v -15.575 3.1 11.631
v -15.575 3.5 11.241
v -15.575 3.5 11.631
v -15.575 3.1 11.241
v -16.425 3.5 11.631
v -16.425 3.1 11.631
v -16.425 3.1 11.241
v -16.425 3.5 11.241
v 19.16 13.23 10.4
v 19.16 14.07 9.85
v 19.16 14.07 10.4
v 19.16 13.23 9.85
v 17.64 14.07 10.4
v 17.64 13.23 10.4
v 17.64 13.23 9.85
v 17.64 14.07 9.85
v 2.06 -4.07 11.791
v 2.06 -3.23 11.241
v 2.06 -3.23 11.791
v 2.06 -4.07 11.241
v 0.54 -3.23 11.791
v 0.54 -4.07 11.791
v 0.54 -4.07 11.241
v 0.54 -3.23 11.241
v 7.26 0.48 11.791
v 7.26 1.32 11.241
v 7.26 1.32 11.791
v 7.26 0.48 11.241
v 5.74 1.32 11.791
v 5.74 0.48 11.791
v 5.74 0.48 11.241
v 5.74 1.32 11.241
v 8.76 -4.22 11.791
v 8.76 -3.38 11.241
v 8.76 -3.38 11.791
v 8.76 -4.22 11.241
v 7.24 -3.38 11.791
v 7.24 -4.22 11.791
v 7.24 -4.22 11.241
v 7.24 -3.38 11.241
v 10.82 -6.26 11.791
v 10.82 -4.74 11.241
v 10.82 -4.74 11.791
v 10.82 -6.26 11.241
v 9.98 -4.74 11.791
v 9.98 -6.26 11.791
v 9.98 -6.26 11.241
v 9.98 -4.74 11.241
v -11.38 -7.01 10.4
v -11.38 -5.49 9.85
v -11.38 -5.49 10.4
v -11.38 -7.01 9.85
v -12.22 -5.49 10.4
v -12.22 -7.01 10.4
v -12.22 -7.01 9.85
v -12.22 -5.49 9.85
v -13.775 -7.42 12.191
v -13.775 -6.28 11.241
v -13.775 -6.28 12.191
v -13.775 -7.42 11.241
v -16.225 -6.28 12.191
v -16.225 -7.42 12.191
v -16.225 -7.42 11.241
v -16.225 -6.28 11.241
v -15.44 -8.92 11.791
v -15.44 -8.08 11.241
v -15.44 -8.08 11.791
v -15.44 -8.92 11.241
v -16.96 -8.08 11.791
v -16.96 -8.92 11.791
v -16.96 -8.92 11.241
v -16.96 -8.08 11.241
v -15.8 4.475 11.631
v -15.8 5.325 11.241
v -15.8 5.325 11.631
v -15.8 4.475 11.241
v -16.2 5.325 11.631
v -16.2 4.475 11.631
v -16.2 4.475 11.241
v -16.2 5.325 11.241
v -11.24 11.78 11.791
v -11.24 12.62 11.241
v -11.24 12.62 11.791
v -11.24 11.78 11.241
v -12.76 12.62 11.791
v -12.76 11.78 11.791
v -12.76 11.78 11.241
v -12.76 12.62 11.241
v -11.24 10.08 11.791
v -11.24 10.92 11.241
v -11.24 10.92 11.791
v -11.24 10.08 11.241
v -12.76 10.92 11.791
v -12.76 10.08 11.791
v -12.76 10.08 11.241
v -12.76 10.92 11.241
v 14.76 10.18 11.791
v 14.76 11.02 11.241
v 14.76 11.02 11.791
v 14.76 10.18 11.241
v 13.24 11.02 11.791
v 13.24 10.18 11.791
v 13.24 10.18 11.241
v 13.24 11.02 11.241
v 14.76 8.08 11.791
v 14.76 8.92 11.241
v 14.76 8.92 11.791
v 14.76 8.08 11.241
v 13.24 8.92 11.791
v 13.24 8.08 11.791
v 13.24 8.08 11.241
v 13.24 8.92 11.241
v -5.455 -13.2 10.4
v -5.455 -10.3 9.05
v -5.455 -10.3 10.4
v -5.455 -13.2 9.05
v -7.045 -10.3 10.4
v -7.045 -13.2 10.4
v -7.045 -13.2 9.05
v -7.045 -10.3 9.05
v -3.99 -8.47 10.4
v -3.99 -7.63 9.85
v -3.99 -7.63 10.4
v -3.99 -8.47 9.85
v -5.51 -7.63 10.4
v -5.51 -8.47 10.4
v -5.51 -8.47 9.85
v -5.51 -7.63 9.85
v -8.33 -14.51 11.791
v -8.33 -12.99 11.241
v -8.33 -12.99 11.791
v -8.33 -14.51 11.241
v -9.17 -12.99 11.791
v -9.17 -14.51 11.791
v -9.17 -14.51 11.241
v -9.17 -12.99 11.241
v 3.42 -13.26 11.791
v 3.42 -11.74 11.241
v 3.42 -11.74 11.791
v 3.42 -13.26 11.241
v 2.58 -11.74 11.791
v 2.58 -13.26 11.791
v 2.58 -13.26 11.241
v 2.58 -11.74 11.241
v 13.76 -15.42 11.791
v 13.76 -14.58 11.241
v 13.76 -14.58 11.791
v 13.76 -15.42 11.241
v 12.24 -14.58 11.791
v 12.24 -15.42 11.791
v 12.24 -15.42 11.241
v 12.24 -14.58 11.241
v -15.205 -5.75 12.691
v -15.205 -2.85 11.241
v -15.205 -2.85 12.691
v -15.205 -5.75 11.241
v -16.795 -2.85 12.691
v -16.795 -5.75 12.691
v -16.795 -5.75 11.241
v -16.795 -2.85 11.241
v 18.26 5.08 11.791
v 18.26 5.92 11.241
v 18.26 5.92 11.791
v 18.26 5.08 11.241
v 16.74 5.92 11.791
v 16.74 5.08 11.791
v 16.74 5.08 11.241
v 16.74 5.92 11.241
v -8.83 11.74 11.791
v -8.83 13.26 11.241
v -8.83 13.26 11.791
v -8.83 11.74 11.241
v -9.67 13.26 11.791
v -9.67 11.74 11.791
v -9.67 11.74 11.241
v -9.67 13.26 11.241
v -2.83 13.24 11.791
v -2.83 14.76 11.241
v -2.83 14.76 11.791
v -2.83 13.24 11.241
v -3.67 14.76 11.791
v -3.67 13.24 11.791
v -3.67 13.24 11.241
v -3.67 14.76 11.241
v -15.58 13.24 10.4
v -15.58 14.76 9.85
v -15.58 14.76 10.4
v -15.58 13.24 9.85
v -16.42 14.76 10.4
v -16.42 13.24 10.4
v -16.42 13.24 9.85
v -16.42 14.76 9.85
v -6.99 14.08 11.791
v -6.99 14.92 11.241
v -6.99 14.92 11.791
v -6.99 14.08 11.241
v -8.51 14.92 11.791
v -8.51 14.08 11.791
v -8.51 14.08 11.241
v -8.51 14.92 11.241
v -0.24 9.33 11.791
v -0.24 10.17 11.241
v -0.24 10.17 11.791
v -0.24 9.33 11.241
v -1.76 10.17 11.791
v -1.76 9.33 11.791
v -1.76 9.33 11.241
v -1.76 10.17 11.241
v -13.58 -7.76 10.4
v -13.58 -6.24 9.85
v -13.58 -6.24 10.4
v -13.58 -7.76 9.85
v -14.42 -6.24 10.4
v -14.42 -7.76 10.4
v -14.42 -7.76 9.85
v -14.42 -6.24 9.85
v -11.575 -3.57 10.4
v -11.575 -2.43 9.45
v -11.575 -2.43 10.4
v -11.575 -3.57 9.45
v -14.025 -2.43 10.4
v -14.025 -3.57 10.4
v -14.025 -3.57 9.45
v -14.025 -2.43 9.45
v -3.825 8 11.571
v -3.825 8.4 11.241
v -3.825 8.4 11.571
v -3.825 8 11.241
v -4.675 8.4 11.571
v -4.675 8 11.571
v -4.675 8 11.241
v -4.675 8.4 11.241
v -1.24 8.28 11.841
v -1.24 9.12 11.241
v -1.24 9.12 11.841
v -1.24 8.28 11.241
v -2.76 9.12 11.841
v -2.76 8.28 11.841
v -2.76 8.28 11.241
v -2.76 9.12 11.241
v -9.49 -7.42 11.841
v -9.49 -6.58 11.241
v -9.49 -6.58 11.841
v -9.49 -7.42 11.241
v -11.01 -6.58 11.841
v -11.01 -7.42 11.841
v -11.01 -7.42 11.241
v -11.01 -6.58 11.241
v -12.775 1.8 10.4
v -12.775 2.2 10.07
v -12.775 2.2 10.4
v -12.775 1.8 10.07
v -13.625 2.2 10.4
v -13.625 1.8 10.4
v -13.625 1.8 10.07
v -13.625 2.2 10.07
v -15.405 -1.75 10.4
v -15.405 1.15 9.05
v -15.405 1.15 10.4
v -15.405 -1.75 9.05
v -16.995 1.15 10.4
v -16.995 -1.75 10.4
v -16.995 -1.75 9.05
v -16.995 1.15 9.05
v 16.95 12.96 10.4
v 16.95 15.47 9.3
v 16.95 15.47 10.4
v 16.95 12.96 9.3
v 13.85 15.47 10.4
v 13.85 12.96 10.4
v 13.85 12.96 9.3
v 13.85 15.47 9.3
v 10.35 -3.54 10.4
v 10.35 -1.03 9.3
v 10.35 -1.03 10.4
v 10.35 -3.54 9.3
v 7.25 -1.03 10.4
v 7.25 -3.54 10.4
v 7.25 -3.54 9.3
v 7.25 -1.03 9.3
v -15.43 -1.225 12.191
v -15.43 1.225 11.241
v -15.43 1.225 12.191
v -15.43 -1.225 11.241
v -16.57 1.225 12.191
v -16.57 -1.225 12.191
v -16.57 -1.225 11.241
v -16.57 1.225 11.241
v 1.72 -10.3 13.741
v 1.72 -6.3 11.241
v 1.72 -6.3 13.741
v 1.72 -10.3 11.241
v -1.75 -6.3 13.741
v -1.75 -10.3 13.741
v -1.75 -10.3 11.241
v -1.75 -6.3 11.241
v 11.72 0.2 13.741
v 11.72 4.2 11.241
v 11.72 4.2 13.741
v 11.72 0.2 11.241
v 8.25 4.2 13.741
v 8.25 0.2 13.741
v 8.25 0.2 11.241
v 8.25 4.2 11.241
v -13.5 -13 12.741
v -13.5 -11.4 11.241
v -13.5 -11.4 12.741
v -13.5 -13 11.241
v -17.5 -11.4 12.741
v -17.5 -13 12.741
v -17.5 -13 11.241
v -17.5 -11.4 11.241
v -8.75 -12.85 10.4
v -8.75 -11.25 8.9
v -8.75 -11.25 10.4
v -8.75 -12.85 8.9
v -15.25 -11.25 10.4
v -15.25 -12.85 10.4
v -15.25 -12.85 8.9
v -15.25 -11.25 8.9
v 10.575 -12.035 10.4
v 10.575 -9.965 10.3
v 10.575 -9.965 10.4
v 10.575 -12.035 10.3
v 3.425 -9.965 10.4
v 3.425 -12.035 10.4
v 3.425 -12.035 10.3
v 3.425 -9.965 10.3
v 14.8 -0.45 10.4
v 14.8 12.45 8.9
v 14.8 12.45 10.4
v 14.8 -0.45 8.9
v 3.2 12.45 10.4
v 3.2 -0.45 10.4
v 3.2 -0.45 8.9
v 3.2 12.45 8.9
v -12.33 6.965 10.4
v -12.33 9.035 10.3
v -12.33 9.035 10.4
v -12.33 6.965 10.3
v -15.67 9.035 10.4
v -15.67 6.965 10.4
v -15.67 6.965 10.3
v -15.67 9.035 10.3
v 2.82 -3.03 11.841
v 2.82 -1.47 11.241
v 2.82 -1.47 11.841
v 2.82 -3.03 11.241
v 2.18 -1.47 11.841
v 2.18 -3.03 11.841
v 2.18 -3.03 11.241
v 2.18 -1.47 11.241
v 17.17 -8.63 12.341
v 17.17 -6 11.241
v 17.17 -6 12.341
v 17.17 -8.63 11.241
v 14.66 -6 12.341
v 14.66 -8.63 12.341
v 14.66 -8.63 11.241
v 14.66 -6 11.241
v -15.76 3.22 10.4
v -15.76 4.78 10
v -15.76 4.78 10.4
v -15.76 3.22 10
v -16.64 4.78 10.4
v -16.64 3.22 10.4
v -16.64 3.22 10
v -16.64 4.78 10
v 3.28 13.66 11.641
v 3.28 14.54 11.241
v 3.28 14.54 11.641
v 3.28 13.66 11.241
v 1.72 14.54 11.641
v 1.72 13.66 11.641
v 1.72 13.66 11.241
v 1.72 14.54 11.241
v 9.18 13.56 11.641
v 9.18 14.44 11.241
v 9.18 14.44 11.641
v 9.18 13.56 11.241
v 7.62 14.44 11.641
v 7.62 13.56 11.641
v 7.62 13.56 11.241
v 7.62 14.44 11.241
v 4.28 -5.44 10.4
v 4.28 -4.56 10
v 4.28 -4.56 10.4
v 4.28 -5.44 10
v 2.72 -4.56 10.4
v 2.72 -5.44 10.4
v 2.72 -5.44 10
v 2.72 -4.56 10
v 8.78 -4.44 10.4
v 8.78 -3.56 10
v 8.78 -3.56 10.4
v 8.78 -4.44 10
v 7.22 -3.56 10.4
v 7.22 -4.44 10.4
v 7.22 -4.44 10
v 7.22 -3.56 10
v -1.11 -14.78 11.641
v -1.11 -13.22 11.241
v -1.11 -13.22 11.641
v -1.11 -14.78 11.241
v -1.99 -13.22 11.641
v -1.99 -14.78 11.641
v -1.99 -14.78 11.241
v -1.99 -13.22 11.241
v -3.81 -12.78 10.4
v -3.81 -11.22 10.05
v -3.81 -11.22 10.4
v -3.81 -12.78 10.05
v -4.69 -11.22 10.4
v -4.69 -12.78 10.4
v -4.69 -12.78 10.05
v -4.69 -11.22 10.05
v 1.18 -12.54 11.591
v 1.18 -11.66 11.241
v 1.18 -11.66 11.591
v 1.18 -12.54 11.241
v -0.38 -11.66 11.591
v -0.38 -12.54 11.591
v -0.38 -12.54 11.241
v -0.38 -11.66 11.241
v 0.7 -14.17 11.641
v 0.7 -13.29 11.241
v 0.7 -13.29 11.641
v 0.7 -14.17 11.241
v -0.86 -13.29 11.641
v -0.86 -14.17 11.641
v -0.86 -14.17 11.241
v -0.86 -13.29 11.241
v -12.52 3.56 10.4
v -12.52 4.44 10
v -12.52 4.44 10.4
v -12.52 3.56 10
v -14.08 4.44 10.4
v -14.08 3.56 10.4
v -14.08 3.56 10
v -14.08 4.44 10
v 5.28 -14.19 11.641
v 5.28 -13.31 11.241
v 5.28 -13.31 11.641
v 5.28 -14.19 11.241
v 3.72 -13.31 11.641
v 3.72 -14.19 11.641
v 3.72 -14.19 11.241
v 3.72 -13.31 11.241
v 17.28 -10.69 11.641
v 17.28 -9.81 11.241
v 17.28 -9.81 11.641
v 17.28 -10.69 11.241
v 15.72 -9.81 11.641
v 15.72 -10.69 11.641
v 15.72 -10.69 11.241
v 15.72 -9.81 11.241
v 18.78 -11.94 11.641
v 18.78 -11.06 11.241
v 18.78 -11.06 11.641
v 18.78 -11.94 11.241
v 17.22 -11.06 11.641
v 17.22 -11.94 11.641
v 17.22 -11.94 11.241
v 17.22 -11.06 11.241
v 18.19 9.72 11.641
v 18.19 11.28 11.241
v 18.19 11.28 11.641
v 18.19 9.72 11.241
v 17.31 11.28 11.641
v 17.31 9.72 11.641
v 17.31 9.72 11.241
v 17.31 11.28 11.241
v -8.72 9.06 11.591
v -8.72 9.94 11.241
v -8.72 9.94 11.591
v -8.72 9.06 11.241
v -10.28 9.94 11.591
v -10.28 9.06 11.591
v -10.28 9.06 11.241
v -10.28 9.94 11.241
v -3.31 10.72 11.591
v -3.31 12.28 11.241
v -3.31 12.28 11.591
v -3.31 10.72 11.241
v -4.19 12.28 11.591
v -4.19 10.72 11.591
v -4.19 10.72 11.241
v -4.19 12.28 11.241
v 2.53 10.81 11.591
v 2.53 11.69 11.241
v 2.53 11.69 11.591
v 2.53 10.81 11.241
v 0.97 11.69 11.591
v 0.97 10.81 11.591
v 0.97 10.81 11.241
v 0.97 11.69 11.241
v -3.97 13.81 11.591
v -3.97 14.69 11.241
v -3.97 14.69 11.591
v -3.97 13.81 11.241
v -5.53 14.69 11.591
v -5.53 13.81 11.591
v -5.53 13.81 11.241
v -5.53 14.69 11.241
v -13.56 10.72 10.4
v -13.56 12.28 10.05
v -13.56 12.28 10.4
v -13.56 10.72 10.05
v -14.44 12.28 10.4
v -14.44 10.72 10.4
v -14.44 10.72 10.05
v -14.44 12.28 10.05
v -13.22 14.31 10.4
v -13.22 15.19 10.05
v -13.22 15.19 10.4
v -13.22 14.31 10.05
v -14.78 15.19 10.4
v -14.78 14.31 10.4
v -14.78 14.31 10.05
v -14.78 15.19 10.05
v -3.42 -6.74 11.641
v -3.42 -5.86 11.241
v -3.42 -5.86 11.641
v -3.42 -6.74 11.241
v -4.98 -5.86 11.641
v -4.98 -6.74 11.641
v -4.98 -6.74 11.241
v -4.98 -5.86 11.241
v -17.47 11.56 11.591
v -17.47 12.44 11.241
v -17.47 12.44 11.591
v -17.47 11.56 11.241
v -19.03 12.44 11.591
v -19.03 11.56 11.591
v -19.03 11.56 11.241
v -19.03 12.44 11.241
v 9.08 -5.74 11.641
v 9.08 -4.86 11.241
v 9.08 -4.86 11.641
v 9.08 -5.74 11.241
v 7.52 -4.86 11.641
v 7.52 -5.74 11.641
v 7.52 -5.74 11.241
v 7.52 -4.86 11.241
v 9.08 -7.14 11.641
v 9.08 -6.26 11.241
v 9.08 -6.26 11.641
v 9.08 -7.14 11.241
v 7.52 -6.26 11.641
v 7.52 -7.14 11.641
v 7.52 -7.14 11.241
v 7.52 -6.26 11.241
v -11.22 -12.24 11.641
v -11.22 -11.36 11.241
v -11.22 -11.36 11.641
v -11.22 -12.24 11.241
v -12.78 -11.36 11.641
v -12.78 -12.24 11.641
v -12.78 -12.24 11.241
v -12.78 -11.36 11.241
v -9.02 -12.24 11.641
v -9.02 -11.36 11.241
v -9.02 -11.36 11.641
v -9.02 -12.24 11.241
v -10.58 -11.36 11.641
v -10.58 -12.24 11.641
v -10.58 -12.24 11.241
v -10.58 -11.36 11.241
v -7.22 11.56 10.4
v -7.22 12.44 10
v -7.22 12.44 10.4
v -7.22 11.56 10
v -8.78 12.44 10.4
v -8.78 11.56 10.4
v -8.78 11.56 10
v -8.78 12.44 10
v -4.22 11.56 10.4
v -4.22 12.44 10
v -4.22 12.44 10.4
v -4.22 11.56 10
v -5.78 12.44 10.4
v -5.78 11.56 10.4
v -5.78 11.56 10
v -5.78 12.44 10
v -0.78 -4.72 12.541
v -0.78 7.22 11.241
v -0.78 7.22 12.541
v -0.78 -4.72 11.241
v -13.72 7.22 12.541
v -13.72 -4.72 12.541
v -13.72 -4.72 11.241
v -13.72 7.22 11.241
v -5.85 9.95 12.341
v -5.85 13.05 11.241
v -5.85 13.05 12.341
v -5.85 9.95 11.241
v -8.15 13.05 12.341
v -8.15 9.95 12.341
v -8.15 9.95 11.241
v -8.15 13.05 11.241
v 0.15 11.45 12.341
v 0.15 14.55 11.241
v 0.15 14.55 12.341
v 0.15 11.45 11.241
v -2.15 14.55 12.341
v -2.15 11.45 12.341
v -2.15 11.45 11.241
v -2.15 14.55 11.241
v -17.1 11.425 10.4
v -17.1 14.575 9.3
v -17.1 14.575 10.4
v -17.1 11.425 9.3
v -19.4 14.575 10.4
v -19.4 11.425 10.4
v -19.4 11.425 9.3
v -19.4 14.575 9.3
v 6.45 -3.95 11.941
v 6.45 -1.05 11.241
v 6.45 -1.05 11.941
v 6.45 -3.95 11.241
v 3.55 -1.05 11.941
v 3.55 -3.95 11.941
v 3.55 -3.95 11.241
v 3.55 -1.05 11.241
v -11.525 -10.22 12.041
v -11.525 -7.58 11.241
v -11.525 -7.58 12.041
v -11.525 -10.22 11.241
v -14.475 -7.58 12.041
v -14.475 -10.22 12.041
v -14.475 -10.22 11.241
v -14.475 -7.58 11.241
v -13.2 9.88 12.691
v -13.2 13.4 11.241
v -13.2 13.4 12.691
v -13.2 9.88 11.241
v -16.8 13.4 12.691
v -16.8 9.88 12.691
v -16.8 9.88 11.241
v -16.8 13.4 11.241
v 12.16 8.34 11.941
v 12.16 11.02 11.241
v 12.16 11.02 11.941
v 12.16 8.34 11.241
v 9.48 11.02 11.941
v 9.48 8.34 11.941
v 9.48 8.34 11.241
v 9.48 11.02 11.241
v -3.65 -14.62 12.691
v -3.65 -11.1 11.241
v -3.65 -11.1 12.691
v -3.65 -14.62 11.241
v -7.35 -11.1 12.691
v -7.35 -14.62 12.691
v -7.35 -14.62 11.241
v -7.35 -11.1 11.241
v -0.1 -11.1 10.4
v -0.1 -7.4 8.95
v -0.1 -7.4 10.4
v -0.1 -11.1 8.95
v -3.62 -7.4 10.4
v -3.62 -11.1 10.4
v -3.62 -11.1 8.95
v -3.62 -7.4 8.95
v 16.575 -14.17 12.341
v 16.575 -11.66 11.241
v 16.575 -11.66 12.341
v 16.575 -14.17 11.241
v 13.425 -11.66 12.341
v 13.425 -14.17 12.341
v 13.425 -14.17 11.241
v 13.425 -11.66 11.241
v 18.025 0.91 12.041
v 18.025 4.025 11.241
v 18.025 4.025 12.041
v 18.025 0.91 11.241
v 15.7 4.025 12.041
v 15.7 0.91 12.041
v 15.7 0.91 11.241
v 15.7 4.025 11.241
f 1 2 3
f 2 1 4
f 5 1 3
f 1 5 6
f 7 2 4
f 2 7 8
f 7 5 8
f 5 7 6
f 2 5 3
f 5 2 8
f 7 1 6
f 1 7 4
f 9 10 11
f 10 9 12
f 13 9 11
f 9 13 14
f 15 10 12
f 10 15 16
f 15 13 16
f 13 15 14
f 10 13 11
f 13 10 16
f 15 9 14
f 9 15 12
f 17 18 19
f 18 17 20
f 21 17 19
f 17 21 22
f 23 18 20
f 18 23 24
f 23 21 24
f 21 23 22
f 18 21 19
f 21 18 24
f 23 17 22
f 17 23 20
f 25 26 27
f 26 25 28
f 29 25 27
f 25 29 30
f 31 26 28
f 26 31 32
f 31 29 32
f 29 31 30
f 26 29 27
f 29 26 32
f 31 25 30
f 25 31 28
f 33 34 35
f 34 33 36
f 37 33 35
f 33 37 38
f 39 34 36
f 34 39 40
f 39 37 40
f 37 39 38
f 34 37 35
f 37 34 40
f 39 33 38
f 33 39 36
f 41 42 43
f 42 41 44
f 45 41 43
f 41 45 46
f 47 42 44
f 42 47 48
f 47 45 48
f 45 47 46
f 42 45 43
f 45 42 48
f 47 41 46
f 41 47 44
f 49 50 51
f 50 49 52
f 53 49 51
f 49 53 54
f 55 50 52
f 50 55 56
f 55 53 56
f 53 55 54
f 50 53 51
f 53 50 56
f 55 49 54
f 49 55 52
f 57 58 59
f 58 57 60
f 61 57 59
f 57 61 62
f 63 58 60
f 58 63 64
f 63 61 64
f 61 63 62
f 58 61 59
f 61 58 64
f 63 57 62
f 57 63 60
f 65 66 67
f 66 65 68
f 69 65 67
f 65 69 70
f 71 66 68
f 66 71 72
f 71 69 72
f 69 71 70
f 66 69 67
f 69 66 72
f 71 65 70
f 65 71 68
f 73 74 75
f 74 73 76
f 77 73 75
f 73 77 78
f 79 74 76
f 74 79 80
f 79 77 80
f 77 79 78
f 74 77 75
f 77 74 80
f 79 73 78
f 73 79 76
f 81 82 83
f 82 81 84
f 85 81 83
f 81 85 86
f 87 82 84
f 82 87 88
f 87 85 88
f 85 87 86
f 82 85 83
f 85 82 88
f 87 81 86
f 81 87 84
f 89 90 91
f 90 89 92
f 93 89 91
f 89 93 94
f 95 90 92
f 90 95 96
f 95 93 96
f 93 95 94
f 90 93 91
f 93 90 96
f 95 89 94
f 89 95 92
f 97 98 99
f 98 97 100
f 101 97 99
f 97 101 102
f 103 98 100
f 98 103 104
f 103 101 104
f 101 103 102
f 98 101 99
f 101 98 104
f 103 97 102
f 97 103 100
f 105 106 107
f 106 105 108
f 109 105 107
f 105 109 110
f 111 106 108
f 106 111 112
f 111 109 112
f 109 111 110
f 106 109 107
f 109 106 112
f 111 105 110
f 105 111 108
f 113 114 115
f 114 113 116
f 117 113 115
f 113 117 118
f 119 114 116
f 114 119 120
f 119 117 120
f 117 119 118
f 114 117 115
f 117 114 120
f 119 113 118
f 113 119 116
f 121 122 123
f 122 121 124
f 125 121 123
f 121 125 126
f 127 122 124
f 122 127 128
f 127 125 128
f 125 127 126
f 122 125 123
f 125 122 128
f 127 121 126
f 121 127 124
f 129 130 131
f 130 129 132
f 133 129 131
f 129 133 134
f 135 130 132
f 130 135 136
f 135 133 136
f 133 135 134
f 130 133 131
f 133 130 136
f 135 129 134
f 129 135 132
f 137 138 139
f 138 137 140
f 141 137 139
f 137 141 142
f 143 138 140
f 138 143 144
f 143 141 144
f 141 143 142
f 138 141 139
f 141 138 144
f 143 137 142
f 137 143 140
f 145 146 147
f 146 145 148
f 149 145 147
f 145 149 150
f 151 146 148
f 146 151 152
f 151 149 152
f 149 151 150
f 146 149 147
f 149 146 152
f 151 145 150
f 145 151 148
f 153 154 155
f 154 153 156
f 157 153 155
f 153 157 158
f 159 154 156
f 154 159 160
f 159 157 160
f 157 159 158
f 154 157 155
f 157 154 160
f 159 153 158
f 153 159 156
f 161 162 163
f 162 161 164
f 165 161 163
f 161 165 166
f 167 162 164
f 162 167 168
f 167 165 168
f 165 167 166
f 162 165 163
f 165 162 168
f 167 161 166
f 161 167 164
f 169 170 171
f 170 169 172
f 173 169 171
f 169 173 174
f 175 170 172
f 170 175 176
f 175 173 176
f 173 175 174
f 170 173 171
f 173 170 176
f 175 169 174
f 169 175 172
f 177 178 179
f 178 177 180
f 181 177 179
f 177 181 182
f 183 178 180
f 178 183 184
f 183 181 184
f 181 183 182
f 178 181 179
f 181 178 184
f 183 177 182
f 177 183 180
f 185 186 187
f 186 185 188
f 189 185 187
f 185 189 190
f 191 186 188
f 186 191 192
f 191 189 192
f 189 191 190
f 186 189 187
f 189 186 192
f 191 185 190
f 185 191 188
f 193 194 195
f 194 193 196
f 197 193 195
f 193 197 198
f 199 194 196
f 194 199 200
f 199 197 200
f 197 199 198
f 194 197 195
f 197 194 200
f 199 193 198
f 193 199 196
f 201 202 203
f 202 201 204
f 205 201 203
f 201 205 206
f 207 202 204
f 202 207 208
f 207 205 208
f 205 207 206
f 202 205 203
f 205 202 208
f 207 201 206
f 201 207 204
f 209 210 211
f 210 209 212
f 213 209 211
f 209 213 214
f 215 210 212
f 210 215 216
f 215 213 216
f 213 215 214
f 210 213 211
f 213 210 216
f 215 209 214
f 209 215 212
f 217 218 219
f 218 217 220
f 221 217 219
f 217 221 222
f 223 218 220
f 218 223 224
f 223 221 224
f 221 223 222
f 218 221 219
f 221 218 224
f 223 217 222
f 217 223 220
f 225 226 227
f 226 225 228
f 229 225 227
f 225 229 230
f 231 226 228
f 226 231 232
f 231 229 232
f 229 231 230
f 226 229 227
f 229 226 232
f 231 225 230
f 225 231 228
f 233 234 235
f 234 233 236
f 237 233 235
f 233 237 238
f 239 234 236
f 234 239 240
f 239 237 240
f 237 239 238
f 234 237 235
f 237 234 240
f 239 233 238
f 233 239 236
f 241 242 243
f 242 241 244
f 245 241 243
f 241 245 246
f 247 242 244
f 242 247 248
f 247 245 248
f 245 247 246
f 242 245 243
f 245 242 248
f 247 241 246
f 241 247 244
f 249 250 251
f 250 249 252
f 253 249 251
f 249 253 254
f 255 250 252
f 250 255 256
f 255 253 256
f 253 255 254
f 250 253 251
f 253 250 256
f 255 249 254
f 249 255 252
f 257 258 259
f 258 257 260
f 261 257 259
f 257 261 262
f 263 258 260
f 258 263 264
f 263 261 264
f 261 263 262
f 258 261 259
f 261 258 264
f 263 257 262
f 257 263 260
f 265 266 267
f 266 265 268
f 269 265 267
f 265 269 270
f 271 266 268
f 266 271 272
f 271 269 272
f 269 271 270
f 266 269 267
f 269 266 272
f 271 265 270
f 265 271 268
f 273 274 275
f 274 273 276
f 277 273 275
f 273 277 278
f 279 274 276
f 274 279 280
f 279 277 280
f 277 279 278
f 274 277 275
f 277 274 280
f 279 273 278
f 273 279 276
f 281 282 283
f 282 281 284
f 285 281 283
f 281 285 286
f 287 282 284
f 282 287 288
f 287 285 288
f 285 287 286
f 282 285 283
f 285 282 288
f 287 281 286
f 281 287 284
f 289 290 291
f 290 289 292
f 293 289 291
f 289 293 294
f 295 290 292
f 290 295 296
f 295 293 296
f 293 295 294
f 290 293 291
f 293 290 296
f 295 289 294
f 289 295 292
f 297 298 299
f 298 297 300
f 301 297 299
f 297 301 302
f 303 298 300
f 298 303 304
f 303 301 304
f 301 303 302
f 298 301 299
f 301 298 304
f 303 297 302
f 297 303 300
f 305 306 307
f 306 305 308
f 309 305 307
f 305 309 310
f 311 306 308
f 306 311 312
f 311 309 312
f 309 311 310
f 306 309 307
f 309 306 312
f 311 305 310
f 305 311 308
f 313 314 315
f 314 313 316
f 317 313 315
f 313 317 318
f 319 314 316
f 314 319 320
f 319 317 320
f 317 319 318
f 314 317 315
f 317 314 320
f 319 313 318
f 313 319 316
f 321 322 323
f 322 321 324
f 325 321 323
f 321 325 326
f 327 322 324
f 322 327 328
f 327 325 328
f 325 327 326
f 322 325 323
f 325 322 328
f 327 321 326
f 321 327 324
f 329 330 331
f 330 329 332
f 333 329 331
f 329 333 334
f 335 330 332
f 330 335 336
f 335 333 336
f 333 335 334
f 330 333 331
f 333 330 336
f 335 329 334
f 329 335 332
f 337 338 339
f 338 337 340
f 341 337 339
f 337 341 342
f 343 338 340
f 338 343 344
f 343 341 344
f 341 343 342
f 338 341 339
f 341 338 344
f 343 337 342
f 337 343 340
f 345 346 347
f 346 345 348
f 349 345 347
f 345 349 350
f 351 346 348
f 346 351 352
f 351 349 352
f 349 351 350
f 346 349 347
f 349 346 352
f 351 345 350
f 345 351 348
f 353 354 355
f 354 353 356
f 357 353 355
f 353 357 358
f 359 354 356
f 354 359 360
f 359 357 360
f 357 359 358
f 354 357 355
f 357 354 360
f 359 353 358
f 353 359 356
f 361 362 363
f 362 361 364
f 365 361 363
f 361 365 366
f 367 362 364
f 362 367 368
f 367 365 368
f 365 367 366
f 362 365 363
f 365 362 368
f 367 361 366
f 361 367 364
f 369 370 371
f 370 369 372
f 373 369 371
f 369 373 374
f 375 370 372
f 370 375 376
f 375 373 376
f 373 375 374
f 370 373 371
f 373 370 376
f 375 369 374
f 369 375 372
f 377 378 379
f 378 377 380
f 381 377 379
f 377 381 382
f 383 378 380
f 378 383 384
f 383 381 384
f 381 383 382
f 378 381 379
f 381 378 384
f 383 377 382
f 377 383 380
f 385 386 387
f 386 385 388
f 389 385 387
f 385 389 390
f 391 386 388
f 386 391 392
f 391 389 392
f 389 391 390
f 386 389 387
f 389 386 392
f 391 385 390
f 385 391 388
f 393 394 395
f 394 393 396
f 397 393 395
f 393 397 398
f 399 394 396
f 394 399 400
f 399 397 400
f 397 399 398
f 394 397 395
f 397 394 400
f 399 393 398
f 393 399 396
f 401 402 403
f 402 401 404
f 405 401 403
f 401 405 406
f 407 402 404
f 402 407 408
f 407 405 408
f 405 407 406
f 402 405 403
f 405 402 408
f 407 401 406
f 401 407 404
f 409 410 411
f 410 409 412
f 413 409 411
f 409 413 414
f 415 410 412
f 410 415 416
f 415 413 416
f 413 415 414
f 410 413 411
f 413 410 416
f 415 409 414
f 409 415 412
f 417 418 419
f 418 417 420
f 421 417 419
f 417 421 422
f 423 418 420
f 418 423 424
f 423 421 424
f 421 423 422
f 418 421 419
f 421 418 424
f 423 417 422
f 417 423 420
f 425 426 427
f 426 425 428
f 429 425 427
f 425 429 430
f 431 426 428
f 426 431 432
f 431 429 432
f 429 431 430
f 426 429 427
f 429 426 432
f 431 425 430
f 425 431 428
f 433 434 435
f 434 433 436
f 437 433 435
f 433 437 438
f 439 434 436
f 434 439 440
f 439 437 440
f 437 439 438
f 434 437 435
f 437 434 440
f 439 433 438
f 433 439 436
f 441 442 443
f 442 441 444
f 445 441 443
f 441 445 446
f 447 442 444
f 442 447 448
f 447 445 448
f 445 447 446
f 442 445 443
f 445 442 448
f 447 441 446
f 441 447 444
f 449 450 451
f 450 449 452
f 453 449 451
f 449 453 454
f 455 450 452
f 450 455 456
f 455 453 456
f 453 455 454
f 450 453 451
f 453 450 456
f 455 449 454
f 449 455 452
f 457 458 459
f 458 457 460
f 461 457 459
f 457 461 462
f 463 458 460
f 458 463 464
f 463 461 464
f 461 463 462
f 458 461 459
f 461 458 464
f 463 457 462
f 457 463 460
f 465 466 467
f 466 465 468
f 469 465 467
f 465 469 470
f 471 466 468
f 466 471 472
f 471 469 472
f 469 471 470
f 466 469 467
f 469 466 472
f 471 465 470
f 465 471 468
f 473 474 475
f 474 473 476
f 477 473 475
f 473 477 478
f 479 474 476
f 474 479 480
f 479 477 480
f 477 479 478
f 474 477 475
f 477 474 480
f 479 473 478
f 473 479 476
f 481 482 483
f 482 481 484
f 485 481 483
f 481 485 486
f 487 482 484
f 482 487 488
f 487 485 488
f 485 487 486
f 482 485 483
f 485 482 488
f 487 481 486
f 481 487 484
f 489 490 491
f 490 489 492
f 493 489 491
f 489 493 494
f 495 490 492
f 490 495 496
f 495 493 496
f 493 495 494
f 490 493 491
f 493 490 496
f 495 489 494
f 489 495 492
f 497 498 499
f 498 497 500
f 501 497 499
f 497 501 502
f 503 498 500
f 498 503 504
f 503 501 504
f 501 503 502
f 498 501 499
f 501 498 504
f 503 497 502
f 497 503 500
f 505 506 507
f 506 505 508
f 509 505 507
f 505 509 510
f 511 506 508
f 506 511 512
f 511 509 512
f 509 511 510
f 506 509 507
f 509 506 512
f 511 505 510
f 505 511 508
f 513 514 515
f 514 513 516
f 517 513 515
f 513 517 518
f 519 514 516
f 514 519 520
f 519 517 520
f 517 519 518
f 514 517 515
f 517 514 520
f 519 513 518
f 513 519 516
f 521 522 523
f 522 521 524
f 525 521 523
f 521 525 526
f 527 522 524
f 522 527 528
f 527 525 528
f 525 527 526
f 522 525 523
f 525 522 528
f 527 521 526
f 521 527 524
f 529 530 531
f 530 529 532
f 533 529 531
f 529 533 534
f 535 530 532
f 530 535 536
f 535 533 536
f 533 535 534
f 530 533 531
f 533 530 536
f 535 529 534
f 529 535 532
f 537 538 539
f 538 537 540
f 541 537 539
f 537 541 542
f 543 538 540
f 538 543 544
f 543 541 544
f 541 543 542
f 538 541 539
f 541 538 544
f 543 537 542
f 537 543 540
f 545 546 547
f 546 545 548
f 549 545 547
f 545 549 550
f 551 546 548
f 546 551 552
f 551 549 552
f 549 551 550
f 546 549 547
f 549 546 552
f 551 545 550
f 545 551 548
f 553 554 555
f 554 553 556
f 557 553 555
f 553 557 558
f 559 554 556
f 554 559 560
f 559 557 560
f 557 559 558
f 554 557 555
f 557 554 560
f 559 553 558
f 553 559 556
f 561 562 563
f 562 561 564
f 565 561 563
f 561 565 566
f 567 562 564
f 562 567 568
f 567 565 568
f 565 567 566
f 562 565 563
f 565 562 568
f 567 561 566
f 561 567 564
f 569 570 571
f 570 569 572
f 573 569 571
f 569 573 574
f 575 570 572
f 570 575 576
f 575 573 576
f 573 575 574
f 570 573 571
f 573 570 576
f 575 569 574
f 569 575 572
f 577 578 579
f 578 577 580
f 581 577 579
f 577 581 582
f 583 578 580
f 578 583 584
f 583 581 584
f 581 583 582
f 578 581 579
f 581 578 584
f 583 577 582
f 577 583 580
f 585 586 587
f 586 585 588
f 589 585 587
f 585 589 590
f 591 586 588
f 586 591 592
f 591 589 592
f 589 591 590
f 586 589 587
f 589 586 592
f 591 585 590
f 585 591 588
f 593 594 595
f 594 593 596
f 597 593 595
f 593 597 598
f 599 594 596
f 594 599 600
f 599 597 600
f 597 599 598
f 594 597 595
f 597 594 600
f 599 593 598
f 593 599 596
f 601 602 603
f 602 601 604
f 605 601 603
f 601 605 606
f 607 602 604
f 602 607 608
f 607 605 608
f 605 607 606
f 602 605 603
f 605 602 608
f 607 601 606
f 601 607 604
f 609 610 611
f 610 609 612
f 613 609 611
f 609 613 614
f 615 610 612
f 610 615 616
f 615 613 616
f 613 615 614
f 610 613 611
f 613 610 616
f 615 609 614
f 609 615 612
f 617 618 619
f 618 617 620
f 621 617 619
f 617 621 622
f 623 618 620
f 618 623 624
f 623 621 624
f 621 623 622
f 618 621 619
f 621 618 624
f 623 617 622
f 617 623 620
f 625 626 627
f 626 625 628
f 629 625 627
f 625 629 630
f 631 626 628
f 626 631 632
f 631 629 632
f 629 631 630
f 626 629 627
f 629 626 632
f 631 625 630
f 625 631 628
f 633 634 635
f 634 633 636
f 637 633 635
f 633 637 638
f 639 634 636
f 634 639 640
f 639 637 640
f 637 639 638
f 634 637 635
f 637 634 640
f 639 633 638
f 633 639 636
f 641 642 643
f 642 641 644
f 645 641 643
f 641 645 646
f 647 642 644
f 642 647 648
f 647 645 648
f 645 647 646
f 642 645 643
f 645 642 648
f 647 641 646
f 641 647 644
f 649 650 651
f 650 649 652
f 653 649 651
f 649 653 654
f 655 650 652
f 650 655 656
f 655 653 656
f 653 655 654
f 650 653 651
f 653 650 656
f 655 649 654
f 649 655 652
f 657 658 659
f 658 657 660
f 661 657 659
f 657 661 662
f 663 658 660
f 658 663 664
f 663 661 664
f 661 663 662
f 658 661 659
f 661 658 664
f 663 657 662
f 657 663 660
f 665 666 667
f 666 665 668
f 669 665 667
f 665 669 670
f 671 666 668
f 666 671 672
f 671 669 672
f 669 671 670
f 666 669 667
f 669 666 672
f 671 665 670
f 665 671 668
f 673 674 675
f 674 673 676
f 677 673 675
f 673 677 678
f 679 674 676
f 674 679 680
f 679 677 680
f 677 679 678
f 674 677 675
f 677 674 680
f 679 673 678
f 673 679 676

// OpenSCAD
// Simplified component envelopes at native positions; not supplier 3D models.
color([0.12, 0.13, 0.16])translate([-16.425,3.1,11.24088])cube([0.8500000000000014,0.3999999999999999,0.39]); // C1
color([0.12, 0.13, 0.16])translate([17.64,13.23,9.85])cube([1.5199999999999996,0.8399999999999999,0.55]); // C10
color([0.12, 0.13, 0.16])translate([0.54,-4.07,11.24088])cube([1.52,0.8400000000000003,0.55]); // C13
color([0.12, 0.13, 0.16])translate([5.74,0.48,11.24088])cube([1.5199999999999996,0.8400000000000001,0.55]); // C14
color([0.12, 0.13, 0.16])translate([7.24,-4.22,11.24088])cube([1.5199999999999996,0.8399999999999999,0.55]); // C15
color([0.12, 0.13, 0.16])translate([9.98,-6.26,11.24088])cube([0.8399999999999999,1.5199999999999996,0.55]); // C16
color([0.12, 0.13, 0.16])translate([-12.22,-7.01,9.85])cube([0.8399999999999999,1.5199999999999996,0.55]); // C17
color([0.12, 0.13, 0.16])translate([-16.225,-7.42,11.24088])cube([2.450000000000001,1.1399999999999997,0.95]); // C18
color([0.12, 0.13, 0.16])translate([-16.96,-8.92,11.24088])cube([1.5200000000000014,0.8399999999999999,0.55]); // C19
color([0.12, 0.13, 0.16])translate([-16.2,4.475,11.24088])cube([0.3999999999999986,0.8500000000000005,0.39]); // C2
color([0.12, 0.13, 0.16])translate([-12.76,11.78,11.24088])cube([1.5199999999999996,0.8399999999999999,0.55]); // C20
color([0.12, 0.13, 0.16])translate([-12.76,10.08,11.24088])cube([1.5199999999999996,0.8399999999999999,0.55]); // C21
color([0.12, 0.13, 0.16])translate([13.24,10.18,11.24088])cube([1.5199999999999996,0.8399999999999999,0.55]); // C23
color([0.12, 0.13, 0.16])translate([13.24,8.08,11.24088])cube([1.5199999999999996,0.8399999999999999,0.55]); // C24
color([0.12, 0.13, 0.16])translate([-7.045,-13.2,9.05])cube([1.5899999999999999,2.8999999999999986,1.35]); // C25
color([0.12, 0.13, 0.16])translate([-5.51,-8.47,9.85])cube([1.5199999999999996,0.8400000000000007,0.55]); // C26
color([0.12, 0.13, 0.16])translate([-9.17,-14.51,11.24088])cube([0.8399999999999999,1.5199999999999996,0.55]); // C27
color([0.12, 0.13, 0.16])translate([2.58,-13.26,11.24088])cube([0.8399999999999999,1.5199999999999996,0.55]); // C28
color([0.12, 0.13, 0.16])translate([12.24,-15.42,11.24088])cube([1.5199999999999996,0.8399999999999999,0.55]); // C29
color([0.12, 0.13, 0.16])translate([-16.795,-5.75,11.24088])cube([1.5900000000000016,2.9,1.45]); // C3
color([0.12, 0.13, 0.16])translate([16.74,5.08,11.24088])cube([1.5200000000000031,0.8399999999999999,0.55]); // C30
color([0.12, 0.13, 0.16])translate([-9.67,11.74,11.24088])cube([0.8399999999999999,1.5199999999999996,0.55]); // C31
color([0.12, 0.13, 0.16])translate([-3.67,13.24,11.24088])cube([0.8399999999999999,1.5199999999999996,0.55]); // C32
color([0.12, 0.13, 0.16])translate([-16.42,13.24,9.85])cube([0.8400000000000016,1.5199999999999996,0.55]); // C33
color([0.12, 0.13, 0.16])translate([-8.51,14.08,11.24088])cube([1.5199999999999996,0.8399999999999999,0.55]); // C34
color([0.12, 0.13, 0.16])translate([-1.76,9.33,11.24088])cube([1.52,0.8399999999999999,0.55]); // C35
color([0.12, 0.13, 0.16])translate([-14.42,-7.76,9.85])cube([0.8399999999999999,1.5199999999999996,0.55]); // C36
color([0.12, 0.13, 0.16])translate([-14.025,-3.57,9.450000000000001])cube([2.450000000000001,1.1399999999999997,0.95]); // C4
color([0.12, 0.13, 0.16])translate([-4.675,8.0,11.24088])cube([0.8499999999999996,0.40000000000000036,0.33]); // C5
color([0.12, 0.13, 0.16])translate([-2.76,8.28,11.24088])cube([1.5199999999999998,0.8399999999999999,0.6]); // C6
color([0.12, 0.13, 0.16])translate([-11.01,-7.42,11.24088])cube([1.5199999999999996,0.8399999999999999,0.6]); // C7
color([0.12, 0.13, 0.16])translate([-13.625,1.8,10.07])cube([0.8499999999999996,0.40000000000000013,0.33]); // C8
color([0.12, 0.13, 0.16])translate([-16.995,-1.75,9.05])cube([1.5900000000000016,2.9,1.35]); // C9
color([0.12, 0.13, 0.16])translate([13.85,12.96,9.3])cube([3.0999999999999996,2.51,1.1]); // D1
color([0.12, 0.13, 0.16])translate([7.25,-3.54,9.3])cube([3.0999999999999996,2.51,1.1]); // D2
color([0.12, 0.13, 0.16])translate([-16.57,-1.225,11.24088])cube([1.1400000000000006,2.45,0.95]); // FB1
color([0.12, 0.13, 0.16])translate([-1.75,-10.3,11.24088])cube([3.4699999999999998,4.000000000000001,2.5]); // J1
color([0.12, 0.13, 0.16])translate([8.25,0.2,11.24088])cube([3.4700000000000006,4.0,2.5]); // J2
color([0.12, 0.13, 0.16])translate([-17.5,-13.0,11.24088])cube([4.0,1.5999999999999996,1.5]); // J3
color([0.12, 0.13, 0.16])translate([-15.25,-12.85,8.9])cube([6.5,1.5999999999999996,1.5]); // J4
color([0.12, 0.13, 0.16])translate([3.425,-12.035,10.3])cube([7.1499999999999995,2.0700000000000003,0.1]); // J5
color([0.57, 0.6, 0.64])translate([3.2,-0.45,8.9])cube([11.600000000000001,12.899999999999999,1.5]); // J6
color([0.12, 0.13, 0.16])translate([-15.67,6.965,10.3])cube([3.34,2.0700000000000003,0.1]); // J7
color([0.12, 0.13, 0.16])translate([2.18,-3.03,11.24088])cube([0.6399999999999997,1.5599999999999998,0.6]); // L1
color([0.12, 0.13, 0.16])translate([14.66,-8.63,11.24088])cube([2.5100000000000016,2.630000000000001,1.1]); // Q1
color([0.12, 0.13, 0.16])translate([-16.64,3.22,10.0])cube([0.8800000000000008,1.56,0.4]); // R1
color([0.12, 0.13, 0.16])translate([1.72,13.66,11.24088])cube([1.5599999999999998,0.879999999999999,0.4]); // R12
color([0.12, 0.13, 0.16])translate([7.62,13.56,11.24088])cube([1.5599999999999996,0.879999999999999,0.4]); // R13
color([0.12, 0.13, 0.16])translate([2.72,-5.44,10.0])cube([1.56,0.8800000000000008,0.4]); // R14
color([0.12, 0.13, 0.16])translate([7.22,-4.44,10.0])cube([1.5599999999999996,0.8800000000000003,0.4]); // R15
color([0.12, 0.13, 0.16])translate([-1.99,-14.78,11.24088])cube([0.8799999999999999,1.5599999999999987,0.4]); // R16
color([0.12, 0.13, 0.16])translate([-4.69,-12.78,10.05])cube([0.8800000000000003,1.5599999999999987,0.35]); // R17
color([0.12, 0.13, 0.16])translate([-0.38,-12.54,11.24088])cube([1.56,0.879999999999999,0.35]); // R18
color([0.12, 0.13, 0.16])translate([-0.86,-14.17,11.24088])cube([1.56,0.8800000000000008,0.4]); // R19
color([0.12, 0.13, 0.16])translate([-14.08,3.56,10.0])cube([1.5600000000000005,0.8800000000000003,0.4]); // R2
color([0.12, 0.13, 0.16])translate([3.72,-14.19,11.24088])cube([1.56,0.879999999999999,0.4]); // R20
color([0.12, 0.13, 0.16])translate([15.72,-10.69,11.24088])cube([1.5600000000000005,0.879999999999999,0.4]); // R21
color([0.12, 0.13, 0.16])translate([17.22,-11.94,11.24088])cube([1.5600000000000023,0.879999999999999,0.4]); // R22
color([0.12, 0.13, 0.16])translate([17.31,9.72,11.24088])cube([0.8800000000000026,1.5599999999999987,0.4]); // R23
color([0.12, 0.13, 0.16])translate([-10.28,9.06,11.24088])cube([1.5599999999999987,0.879999999999999,0.35]); // R24
color([0.12, 0.13, 0.16])translate([-4.19,10.72,11.24088])cube([0.8800000000000003,1.5599999999999987,0.35]); // R25
color([0.12, 0.13, 0.16])translate([0.97,10.81,11.24088])cube([1.5599999999999998,0.879999999999999,0.35]); // R26
color([0.12, 0.13, 0.16])translate([-5.53,13.81,11.24088])cube([1.56,0.879999999999999,0.35]); // R27
color([0.12, 0.13, 0.16])translate([-14.44,10.72,10.05])cube([0.879999999999999,1.5599999999999987,0.35]); // R28
color([0.12, 0.13, 0.16])translate([-14.78,14.31,10.05])cube([1.5599999999999987,0.879999999999999,0.35]); // R29
color([0.12, 0.13, 0.16])translate([-4.98,-6.74,11.24088])cube([1.5600000000000005,0.8799999999999999,0.4]); // R3
color([0.12, 0.13, 0.16])translate([-19.03,11.56,11.24088])cube([1.5600000000000023,0.879999999999999,0.35]); // R30
color([0.12, 0.13, 0.16])translate([7.52,-5.74,11.24088])cube([1.5600000000000005,0.8799999999999999,0.4]); // R4
color([0.12, 0.13, 0.16])translate([7.52,-7.14,11.24088])cube([1.5600000000000005,0.8799999999999999,0.4]); // R5
color([0.12, 0.13, 0.16])translate([-12.78,-12.24,11.24088])cube([1.5599999999999987,0.8800000000000008,0.4]); // R6
color([0.12, 0.13, 0.16])translate([-10.58,-12.24,11.24088])cube([1.5600000000000005,0.8800000000000008,0.4]); // R7
color([0.12, 0.13, 0.16])translate([-8.78,11.56,10.0])cube([1.5599999999999996,0.879999999999999,0.4]); // R8
color([0.12, 0.13, 0.16])translate([-5.78,11.56,10.0])cube([1.5600000000000005,0.879999999999999,0.4]); // R9
color([0.57, 0.6, 0.64])translate([-13.72,-4.72,11.24088])cube([12.940000000000001,11.94,1.3]); // U1
color([0.12, 0.13, 0.16])translate([-8.15,9.95,11.24088])cube([2.3000000000000007,3.1000000000000014,1.1]); // U10
color([0.12, 0.13, 0.16])translate([-2.15,11.45,11.24088])cube([2.3,3.1000000000000014,1.1]); // U11
color([0.12, 0.13, 0.16])translate([-19.4,11.425,9.3])cube([2.299999999999997,3.1499999999999986,1.1]); // U12
color([0.12, 0.13, 0.16])translate([3.55,-3.95,11.24088])cube([2.89999,2.9000000000000004,0.7]); // U2
color([0.12, 0.13, 0.16])translate([-14.475,-10.22,11.24088])cube([2.9499999999999993,2.6400000000000006,0.8]); // U3
color([0.12, 0.13, 0.16])translate([-16.8,9.88,11.24088])cube([3.6000000000000014,3.5199999999999996,1.45]); // U4
color([0.12, 0.13, 0.16])translate([9.48,8.34,11.24088])cube([2.6799999999999997,2.6799999999999997,0.7]); // U5
color([0.12, 0.13, 0.16])translate([-7.35,-14.62,11.24088])cube([3.6999999999999997,3.5199999999999996,1.45]); // U6
color([0.12, 0.13, 0.16])translate([-3.62,-11.1,8.950000000000001])cube([3.52,3.6999999999999993,1.45]); // U7
color([0.12, 0.13, 0.16])translate([13.425,-14.17,11.24088])cube([3.1499999999999986,2.51,1.1]); // U8
color([0.12, 0.13, 0.16])translate([15.7,0.91,11.24088])cube([2.3249999999999993,3.115,0.8]); // U9
